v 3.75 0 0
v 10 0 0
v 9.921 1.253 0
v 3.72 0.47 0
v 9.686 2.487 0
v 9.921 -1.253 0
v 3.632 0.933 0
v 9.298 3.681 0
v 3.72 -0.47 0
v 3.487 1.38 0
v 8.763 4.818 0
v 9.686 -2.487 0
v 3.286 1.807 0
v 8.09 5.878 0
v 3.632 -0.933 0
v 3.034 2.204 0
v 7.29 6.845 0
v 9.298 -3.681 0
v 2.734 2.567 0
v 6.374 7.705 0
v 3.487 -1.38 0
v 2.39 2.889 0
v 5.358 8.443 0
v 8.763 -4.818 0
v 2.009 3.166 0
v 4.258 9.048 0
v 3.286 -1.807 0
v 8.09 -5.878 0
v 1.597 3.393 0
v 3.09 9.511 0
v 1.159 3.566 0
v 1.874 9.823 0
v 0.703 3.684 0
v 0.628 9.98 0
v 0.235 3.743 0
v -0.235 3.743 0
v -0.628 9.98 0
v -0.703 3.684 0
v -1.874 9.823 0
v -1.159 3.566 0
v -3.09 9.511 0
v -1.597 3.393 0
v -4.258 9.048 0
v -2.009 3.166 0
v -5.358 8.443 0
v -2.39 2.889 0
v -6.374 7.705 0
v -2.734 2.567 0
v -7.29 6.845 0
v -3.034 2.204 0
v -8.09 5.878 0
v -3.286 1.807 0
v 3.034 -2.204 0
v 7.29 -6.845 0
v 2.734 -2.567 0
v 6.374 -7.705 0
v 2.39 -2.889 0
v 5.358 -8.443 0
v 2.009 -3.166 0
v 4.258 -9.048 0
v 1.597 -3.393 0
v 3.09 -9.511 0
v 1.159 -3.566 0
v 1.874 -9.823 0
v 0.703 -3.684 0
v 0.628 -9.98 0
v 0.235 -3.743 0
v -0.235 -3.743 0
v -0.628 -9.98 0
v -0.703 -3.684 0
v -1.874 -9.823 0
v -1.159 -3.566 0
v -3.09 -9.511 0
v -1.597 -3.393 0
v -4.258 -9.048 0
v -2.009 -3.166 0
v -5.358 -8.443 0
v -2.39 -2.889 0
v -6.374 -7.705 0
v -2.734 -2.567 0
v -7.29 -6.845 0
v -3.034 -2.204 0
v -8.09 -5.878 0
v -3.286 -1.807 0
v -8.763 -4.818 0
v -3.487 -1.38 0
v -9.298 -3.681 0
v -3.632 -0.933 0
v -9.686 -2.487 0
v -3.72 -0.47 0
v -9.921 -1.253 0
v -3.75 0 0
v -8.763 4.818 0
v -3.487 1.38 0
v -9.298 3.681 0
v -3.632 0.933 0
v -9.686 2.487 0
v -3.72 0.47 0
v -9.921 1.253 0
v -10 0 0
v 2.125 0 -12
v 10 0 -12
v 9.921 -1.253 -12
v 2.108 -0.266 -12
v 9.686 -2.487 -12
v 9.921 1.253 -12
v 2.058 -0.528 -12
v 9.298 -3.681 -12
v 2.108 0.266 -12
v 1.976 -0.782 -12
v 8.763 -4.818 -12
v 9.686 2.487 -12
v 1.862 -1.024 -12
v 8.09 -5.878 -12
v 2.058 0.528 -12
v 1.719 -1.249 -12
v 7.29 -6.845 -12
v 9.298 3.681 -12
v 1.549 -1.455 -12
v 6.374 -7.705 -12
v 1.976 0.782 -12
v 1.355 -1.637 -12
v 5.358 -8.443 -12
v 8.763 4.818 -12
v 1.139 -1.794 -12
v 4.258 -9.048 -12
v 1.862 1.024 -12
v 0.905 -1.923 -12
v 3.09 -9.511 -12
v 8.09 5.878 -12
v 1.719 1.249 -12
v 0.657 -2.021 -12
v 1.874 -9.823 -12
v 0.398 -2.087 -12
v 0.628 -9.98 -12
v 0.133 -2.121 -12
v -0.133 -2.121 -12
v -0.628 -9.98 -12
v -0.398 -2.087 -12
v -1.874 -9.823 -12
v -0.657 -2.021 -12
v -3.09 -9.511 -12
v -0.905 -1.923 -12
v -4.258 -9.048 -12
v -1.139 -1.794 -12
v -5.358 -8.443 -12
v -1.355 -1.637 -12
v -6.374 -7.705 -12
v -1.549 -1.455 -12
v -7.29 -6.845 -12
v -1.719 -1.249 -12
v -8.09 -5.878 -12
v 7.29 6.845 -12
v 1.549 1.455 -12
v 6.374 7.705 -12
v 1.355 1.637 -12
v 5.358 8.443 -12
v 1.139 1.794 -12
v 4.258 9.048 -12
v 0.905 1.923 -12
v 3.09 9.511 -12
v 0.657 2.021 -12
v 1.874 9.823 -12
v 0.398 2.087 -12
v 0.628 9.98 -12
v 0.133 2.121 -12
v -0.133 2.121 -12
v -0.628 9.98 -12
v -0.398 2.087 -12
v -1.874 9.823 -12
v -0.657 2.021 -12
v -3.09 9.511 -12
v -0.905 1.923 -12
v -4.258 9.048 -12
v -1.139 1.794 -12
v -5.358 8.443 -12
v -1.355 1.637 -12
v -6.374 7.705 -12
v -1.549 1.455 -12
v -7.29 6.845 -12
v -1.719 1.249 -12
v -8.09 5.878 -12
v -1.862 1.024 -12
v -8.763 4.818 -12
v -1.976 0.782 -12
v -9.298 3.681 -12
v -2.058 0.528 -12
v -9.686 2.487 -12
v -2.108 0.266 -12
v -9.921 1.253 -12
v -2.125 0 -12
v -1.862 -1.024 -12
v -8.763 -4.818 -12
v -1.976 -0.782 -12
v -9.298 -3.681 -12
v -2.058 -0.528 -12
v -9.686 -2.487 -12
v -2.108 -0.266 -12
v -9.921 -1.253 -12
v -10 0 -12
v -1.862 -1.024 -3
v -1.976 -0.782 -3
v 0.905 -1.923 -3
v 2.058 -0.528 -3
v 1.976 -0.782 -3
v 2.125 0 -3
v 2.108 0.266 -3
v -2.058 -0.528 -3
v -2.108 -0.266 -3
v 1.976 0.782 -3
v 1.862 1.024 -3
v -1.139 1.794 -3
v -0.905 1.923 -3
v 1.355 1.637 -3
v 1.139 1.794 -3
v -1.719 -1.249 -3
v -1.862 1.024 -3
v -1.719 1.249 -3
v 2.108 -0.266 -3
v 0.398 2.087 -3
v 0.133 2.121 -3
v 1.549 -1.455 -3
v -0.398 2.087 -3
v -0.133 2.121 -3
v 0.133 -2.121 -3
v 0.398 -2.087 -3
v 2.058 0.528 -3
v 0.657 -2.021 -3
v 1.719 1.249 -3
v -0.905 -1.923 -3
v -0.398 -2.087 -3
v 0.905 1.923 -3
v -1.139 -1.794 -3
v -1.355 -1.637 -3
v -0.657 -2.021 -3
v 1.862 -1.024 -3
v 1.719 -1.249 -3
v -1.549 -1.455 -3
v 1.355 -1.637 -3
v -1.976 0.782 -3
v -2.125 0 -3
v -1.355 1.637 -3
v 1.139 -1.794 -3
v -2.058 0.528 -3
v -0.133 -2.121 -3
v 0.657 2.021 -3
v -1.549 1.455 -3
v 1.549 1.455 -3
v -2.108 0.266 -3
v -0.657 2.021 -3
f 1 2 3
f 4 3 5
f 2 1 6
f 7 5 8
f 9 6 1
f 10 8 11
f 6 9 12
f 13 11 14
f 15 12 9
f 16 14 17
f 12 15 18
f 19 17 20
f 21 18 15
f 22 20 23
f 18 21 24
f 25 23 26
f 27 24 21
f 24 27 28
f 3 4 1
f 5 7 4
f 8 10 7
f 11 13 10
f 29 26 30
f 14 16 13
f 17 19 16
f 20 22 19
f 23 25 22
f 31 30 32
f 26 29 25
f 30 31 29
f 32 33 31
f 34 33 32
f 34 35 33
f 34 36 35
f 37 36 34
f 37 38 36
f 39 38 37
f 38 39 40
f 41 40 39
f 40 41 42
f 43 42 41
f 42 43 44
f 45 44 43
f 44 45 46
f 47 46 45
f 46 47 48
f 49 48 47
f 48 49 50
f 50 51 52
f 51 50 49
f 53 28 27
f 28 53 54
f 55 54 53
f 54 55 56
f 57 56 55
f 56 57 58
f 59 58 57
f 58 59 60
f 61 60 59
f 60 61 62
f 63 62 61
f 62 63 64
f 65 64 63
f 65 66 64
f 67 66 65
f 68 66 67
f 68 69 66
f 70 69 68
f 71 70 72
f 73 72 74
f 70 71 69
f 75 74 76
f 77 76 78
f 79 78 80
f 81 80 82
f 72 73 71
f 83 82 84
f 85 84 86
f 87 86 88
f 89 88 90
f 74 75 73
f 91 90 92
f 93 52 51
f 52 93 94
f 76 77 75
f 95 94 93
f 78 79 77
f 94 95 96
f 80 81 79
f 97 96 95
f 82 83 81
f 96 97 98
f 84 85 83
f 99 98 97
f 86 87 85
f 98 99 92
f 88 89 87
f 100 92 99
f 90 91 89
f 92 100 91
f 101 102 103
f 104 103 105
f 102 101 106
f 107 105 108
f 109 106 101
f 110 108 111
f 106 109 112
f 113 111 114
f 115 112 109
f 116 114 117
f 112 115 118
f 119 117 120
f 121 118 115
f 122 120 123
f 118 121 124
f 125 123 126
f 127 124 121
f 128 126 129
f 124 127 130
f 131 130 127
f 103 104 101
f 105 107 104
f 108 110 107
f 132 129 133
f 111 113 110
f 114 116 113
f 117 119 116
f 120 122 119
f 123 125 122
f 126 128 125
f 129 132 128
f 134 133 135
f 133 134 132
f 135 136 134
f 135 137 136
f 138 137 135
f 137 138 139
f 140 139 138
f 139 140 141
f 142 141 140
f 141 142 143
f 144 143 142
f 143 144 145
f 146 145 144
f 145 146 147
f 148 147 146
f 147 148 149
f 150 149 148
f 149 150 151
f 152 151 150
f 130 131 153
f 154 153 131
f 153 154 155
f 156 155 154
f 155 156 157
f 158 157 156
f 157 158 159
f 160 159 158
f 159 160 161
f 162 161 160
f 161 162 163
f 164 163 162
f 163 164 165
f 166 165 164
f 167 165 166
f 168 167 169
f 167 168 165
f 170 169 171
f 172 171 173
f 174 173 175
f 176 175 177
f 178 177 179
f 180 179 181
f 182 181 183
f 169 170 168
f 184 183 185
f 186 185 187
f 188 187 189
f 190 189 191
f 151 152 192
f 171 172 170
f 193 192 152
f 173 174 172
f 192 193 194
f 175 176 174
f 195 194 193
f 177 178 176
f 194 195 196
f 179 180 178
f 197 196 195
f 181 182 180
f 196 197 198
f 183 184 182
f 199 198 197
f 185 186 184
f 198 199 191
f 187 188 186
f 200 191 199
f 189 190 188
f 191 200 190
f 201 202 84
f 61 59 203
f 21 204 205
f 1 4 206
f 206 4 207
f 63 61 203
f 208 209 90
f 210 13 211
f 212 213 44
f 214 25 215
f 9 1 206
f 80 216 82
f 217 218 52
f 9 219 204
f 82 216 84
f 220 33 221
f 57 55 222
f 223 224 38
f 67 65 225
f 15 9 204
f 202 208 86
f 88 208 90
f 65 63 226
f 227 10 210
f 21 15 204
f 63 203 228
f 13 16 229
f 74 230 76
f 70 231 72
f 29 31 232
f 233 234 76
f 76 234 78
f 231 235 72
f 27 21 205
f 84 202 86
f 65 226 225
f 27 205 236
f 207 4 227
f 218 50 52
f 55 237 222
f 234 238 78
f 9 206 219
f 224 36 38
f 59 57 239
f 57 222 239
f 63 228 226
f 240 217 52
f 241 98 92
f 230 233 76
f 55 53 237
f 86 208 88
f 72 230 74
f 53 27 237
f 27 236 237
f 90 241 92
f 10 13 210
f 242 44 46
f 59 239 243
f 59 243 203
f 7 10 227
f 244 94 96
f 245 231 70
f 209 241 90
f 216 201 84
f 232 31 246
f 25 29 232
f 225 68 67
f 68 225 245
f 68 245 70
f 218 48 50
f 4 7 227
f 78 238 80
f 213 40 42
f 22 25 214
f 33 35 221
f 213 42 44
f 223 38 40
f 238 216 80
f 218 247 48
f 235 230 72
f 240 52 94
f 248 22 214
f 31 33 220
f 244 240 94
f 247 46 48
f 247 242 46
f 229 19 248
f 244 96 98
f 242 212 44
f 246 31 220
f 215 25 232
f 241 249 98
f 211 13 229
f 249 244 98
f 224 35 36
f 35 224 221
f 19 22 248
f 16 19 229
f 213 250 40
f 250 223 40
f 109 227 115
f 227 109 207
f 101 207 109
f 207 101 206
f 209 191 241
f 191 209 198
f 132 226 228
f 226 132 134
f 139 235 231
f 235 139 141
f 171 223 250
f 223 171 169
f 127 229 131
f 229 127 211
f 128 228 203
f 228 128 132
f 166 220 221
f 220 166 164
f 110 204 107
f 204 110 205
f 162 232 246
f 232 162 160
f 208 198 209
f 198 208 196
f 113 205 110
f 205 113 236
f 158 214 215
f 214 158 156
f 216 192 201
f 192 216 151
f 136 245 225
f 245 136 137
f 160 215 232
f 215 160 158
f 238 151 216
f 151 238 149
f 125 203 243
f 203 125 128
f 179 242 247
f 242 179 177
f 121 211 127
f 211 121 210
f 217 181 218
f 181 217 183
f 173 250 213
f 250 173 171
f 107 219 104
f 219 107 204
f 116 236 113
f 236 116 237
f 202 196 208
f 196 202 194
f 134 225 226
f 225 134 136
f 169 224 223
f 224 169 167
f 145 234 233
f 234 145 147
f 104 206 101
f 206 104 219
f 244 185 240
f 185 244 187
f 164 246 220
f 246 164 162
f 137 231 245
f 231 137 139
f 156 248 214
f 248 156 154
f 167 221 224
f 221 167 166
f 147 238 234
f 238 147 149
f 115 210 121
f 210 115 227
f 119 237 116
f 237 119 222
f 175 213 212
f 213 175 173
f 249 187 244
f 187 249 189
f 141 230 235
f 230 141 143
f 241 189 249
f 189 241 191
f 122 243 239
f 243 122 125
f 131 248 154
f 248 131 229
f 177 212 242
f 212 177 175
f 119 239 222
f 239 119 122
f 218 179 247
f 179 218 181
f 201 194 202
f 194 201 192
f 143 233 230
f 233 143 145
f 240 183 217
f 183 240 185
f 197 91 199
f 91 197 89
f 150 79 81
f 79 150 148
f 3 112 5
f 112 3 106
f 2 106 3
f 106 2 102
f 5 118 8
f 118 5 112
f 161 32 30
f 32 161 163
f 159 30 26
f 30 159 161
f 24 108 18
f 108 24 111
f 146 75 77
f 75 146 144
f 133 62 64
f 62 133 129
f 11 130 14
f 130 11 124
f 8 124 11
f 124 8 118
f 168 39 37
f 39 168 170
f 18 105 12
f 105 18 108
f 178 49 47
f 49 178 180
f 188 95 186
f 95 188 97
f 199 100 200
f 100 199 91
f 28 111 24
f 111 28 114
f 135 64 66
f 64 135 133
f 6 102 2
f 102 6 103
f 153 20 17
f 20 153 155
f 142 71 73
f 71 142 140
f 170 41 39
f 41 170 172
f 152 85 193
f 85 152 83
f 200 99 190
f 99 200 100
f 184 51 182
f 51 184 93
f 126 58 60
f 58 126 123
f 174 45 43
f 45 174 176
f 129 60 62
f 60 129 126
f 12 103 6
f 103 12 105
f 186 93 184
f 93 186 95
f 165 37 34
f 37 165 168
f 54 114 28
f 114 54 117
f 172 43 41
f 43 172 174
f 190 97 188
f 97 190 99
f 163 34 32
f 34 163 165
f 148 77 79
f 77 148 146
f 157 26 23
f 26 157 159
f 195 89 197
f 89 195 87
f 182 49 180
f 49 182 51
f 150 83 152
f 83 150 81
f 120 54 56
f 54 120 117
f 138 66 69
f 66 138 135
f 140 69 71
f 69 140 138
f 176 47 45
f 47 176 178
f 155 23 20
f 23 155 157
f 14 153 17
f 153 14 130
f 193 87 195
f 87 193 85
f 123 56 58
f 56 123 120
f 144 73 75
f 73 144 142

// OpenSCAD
$fn = 50;


difference() {
	union() {
		translate(v = [0, 0, -12.0000000000]) {
			cylinder(h = 12, r = 10.0000000000);
		}
		cylinder(h = 0, r = 20.0000000000);
	}
	union() {
		translate(v = [0, 0, 0]) {
			rotate(a = [0, 0, 0]) {
				difference() {
					union() {
						#translate(v = [0, 0, -12.0000000000]) {
							cylinder(h = 12, r = 2.0000000000);
						}
						#translate(v = [0, 0, -3]) {
							cylinder(h = 3, r = 10.0000000000, r1 = 2.1250000000, r2 = 3.7500000000);
						}
						#translate(v = [0, 0, -12.0000000000]) {
							cylinder(h = 12, r = 2.1250000000);
						}
						#translate(v = [0, 0, -12.0000000000]) {
							cylinder(h = 12, r = 2.0000000000);
						}
					}
					union();
				}
			}
		}
	}
}
